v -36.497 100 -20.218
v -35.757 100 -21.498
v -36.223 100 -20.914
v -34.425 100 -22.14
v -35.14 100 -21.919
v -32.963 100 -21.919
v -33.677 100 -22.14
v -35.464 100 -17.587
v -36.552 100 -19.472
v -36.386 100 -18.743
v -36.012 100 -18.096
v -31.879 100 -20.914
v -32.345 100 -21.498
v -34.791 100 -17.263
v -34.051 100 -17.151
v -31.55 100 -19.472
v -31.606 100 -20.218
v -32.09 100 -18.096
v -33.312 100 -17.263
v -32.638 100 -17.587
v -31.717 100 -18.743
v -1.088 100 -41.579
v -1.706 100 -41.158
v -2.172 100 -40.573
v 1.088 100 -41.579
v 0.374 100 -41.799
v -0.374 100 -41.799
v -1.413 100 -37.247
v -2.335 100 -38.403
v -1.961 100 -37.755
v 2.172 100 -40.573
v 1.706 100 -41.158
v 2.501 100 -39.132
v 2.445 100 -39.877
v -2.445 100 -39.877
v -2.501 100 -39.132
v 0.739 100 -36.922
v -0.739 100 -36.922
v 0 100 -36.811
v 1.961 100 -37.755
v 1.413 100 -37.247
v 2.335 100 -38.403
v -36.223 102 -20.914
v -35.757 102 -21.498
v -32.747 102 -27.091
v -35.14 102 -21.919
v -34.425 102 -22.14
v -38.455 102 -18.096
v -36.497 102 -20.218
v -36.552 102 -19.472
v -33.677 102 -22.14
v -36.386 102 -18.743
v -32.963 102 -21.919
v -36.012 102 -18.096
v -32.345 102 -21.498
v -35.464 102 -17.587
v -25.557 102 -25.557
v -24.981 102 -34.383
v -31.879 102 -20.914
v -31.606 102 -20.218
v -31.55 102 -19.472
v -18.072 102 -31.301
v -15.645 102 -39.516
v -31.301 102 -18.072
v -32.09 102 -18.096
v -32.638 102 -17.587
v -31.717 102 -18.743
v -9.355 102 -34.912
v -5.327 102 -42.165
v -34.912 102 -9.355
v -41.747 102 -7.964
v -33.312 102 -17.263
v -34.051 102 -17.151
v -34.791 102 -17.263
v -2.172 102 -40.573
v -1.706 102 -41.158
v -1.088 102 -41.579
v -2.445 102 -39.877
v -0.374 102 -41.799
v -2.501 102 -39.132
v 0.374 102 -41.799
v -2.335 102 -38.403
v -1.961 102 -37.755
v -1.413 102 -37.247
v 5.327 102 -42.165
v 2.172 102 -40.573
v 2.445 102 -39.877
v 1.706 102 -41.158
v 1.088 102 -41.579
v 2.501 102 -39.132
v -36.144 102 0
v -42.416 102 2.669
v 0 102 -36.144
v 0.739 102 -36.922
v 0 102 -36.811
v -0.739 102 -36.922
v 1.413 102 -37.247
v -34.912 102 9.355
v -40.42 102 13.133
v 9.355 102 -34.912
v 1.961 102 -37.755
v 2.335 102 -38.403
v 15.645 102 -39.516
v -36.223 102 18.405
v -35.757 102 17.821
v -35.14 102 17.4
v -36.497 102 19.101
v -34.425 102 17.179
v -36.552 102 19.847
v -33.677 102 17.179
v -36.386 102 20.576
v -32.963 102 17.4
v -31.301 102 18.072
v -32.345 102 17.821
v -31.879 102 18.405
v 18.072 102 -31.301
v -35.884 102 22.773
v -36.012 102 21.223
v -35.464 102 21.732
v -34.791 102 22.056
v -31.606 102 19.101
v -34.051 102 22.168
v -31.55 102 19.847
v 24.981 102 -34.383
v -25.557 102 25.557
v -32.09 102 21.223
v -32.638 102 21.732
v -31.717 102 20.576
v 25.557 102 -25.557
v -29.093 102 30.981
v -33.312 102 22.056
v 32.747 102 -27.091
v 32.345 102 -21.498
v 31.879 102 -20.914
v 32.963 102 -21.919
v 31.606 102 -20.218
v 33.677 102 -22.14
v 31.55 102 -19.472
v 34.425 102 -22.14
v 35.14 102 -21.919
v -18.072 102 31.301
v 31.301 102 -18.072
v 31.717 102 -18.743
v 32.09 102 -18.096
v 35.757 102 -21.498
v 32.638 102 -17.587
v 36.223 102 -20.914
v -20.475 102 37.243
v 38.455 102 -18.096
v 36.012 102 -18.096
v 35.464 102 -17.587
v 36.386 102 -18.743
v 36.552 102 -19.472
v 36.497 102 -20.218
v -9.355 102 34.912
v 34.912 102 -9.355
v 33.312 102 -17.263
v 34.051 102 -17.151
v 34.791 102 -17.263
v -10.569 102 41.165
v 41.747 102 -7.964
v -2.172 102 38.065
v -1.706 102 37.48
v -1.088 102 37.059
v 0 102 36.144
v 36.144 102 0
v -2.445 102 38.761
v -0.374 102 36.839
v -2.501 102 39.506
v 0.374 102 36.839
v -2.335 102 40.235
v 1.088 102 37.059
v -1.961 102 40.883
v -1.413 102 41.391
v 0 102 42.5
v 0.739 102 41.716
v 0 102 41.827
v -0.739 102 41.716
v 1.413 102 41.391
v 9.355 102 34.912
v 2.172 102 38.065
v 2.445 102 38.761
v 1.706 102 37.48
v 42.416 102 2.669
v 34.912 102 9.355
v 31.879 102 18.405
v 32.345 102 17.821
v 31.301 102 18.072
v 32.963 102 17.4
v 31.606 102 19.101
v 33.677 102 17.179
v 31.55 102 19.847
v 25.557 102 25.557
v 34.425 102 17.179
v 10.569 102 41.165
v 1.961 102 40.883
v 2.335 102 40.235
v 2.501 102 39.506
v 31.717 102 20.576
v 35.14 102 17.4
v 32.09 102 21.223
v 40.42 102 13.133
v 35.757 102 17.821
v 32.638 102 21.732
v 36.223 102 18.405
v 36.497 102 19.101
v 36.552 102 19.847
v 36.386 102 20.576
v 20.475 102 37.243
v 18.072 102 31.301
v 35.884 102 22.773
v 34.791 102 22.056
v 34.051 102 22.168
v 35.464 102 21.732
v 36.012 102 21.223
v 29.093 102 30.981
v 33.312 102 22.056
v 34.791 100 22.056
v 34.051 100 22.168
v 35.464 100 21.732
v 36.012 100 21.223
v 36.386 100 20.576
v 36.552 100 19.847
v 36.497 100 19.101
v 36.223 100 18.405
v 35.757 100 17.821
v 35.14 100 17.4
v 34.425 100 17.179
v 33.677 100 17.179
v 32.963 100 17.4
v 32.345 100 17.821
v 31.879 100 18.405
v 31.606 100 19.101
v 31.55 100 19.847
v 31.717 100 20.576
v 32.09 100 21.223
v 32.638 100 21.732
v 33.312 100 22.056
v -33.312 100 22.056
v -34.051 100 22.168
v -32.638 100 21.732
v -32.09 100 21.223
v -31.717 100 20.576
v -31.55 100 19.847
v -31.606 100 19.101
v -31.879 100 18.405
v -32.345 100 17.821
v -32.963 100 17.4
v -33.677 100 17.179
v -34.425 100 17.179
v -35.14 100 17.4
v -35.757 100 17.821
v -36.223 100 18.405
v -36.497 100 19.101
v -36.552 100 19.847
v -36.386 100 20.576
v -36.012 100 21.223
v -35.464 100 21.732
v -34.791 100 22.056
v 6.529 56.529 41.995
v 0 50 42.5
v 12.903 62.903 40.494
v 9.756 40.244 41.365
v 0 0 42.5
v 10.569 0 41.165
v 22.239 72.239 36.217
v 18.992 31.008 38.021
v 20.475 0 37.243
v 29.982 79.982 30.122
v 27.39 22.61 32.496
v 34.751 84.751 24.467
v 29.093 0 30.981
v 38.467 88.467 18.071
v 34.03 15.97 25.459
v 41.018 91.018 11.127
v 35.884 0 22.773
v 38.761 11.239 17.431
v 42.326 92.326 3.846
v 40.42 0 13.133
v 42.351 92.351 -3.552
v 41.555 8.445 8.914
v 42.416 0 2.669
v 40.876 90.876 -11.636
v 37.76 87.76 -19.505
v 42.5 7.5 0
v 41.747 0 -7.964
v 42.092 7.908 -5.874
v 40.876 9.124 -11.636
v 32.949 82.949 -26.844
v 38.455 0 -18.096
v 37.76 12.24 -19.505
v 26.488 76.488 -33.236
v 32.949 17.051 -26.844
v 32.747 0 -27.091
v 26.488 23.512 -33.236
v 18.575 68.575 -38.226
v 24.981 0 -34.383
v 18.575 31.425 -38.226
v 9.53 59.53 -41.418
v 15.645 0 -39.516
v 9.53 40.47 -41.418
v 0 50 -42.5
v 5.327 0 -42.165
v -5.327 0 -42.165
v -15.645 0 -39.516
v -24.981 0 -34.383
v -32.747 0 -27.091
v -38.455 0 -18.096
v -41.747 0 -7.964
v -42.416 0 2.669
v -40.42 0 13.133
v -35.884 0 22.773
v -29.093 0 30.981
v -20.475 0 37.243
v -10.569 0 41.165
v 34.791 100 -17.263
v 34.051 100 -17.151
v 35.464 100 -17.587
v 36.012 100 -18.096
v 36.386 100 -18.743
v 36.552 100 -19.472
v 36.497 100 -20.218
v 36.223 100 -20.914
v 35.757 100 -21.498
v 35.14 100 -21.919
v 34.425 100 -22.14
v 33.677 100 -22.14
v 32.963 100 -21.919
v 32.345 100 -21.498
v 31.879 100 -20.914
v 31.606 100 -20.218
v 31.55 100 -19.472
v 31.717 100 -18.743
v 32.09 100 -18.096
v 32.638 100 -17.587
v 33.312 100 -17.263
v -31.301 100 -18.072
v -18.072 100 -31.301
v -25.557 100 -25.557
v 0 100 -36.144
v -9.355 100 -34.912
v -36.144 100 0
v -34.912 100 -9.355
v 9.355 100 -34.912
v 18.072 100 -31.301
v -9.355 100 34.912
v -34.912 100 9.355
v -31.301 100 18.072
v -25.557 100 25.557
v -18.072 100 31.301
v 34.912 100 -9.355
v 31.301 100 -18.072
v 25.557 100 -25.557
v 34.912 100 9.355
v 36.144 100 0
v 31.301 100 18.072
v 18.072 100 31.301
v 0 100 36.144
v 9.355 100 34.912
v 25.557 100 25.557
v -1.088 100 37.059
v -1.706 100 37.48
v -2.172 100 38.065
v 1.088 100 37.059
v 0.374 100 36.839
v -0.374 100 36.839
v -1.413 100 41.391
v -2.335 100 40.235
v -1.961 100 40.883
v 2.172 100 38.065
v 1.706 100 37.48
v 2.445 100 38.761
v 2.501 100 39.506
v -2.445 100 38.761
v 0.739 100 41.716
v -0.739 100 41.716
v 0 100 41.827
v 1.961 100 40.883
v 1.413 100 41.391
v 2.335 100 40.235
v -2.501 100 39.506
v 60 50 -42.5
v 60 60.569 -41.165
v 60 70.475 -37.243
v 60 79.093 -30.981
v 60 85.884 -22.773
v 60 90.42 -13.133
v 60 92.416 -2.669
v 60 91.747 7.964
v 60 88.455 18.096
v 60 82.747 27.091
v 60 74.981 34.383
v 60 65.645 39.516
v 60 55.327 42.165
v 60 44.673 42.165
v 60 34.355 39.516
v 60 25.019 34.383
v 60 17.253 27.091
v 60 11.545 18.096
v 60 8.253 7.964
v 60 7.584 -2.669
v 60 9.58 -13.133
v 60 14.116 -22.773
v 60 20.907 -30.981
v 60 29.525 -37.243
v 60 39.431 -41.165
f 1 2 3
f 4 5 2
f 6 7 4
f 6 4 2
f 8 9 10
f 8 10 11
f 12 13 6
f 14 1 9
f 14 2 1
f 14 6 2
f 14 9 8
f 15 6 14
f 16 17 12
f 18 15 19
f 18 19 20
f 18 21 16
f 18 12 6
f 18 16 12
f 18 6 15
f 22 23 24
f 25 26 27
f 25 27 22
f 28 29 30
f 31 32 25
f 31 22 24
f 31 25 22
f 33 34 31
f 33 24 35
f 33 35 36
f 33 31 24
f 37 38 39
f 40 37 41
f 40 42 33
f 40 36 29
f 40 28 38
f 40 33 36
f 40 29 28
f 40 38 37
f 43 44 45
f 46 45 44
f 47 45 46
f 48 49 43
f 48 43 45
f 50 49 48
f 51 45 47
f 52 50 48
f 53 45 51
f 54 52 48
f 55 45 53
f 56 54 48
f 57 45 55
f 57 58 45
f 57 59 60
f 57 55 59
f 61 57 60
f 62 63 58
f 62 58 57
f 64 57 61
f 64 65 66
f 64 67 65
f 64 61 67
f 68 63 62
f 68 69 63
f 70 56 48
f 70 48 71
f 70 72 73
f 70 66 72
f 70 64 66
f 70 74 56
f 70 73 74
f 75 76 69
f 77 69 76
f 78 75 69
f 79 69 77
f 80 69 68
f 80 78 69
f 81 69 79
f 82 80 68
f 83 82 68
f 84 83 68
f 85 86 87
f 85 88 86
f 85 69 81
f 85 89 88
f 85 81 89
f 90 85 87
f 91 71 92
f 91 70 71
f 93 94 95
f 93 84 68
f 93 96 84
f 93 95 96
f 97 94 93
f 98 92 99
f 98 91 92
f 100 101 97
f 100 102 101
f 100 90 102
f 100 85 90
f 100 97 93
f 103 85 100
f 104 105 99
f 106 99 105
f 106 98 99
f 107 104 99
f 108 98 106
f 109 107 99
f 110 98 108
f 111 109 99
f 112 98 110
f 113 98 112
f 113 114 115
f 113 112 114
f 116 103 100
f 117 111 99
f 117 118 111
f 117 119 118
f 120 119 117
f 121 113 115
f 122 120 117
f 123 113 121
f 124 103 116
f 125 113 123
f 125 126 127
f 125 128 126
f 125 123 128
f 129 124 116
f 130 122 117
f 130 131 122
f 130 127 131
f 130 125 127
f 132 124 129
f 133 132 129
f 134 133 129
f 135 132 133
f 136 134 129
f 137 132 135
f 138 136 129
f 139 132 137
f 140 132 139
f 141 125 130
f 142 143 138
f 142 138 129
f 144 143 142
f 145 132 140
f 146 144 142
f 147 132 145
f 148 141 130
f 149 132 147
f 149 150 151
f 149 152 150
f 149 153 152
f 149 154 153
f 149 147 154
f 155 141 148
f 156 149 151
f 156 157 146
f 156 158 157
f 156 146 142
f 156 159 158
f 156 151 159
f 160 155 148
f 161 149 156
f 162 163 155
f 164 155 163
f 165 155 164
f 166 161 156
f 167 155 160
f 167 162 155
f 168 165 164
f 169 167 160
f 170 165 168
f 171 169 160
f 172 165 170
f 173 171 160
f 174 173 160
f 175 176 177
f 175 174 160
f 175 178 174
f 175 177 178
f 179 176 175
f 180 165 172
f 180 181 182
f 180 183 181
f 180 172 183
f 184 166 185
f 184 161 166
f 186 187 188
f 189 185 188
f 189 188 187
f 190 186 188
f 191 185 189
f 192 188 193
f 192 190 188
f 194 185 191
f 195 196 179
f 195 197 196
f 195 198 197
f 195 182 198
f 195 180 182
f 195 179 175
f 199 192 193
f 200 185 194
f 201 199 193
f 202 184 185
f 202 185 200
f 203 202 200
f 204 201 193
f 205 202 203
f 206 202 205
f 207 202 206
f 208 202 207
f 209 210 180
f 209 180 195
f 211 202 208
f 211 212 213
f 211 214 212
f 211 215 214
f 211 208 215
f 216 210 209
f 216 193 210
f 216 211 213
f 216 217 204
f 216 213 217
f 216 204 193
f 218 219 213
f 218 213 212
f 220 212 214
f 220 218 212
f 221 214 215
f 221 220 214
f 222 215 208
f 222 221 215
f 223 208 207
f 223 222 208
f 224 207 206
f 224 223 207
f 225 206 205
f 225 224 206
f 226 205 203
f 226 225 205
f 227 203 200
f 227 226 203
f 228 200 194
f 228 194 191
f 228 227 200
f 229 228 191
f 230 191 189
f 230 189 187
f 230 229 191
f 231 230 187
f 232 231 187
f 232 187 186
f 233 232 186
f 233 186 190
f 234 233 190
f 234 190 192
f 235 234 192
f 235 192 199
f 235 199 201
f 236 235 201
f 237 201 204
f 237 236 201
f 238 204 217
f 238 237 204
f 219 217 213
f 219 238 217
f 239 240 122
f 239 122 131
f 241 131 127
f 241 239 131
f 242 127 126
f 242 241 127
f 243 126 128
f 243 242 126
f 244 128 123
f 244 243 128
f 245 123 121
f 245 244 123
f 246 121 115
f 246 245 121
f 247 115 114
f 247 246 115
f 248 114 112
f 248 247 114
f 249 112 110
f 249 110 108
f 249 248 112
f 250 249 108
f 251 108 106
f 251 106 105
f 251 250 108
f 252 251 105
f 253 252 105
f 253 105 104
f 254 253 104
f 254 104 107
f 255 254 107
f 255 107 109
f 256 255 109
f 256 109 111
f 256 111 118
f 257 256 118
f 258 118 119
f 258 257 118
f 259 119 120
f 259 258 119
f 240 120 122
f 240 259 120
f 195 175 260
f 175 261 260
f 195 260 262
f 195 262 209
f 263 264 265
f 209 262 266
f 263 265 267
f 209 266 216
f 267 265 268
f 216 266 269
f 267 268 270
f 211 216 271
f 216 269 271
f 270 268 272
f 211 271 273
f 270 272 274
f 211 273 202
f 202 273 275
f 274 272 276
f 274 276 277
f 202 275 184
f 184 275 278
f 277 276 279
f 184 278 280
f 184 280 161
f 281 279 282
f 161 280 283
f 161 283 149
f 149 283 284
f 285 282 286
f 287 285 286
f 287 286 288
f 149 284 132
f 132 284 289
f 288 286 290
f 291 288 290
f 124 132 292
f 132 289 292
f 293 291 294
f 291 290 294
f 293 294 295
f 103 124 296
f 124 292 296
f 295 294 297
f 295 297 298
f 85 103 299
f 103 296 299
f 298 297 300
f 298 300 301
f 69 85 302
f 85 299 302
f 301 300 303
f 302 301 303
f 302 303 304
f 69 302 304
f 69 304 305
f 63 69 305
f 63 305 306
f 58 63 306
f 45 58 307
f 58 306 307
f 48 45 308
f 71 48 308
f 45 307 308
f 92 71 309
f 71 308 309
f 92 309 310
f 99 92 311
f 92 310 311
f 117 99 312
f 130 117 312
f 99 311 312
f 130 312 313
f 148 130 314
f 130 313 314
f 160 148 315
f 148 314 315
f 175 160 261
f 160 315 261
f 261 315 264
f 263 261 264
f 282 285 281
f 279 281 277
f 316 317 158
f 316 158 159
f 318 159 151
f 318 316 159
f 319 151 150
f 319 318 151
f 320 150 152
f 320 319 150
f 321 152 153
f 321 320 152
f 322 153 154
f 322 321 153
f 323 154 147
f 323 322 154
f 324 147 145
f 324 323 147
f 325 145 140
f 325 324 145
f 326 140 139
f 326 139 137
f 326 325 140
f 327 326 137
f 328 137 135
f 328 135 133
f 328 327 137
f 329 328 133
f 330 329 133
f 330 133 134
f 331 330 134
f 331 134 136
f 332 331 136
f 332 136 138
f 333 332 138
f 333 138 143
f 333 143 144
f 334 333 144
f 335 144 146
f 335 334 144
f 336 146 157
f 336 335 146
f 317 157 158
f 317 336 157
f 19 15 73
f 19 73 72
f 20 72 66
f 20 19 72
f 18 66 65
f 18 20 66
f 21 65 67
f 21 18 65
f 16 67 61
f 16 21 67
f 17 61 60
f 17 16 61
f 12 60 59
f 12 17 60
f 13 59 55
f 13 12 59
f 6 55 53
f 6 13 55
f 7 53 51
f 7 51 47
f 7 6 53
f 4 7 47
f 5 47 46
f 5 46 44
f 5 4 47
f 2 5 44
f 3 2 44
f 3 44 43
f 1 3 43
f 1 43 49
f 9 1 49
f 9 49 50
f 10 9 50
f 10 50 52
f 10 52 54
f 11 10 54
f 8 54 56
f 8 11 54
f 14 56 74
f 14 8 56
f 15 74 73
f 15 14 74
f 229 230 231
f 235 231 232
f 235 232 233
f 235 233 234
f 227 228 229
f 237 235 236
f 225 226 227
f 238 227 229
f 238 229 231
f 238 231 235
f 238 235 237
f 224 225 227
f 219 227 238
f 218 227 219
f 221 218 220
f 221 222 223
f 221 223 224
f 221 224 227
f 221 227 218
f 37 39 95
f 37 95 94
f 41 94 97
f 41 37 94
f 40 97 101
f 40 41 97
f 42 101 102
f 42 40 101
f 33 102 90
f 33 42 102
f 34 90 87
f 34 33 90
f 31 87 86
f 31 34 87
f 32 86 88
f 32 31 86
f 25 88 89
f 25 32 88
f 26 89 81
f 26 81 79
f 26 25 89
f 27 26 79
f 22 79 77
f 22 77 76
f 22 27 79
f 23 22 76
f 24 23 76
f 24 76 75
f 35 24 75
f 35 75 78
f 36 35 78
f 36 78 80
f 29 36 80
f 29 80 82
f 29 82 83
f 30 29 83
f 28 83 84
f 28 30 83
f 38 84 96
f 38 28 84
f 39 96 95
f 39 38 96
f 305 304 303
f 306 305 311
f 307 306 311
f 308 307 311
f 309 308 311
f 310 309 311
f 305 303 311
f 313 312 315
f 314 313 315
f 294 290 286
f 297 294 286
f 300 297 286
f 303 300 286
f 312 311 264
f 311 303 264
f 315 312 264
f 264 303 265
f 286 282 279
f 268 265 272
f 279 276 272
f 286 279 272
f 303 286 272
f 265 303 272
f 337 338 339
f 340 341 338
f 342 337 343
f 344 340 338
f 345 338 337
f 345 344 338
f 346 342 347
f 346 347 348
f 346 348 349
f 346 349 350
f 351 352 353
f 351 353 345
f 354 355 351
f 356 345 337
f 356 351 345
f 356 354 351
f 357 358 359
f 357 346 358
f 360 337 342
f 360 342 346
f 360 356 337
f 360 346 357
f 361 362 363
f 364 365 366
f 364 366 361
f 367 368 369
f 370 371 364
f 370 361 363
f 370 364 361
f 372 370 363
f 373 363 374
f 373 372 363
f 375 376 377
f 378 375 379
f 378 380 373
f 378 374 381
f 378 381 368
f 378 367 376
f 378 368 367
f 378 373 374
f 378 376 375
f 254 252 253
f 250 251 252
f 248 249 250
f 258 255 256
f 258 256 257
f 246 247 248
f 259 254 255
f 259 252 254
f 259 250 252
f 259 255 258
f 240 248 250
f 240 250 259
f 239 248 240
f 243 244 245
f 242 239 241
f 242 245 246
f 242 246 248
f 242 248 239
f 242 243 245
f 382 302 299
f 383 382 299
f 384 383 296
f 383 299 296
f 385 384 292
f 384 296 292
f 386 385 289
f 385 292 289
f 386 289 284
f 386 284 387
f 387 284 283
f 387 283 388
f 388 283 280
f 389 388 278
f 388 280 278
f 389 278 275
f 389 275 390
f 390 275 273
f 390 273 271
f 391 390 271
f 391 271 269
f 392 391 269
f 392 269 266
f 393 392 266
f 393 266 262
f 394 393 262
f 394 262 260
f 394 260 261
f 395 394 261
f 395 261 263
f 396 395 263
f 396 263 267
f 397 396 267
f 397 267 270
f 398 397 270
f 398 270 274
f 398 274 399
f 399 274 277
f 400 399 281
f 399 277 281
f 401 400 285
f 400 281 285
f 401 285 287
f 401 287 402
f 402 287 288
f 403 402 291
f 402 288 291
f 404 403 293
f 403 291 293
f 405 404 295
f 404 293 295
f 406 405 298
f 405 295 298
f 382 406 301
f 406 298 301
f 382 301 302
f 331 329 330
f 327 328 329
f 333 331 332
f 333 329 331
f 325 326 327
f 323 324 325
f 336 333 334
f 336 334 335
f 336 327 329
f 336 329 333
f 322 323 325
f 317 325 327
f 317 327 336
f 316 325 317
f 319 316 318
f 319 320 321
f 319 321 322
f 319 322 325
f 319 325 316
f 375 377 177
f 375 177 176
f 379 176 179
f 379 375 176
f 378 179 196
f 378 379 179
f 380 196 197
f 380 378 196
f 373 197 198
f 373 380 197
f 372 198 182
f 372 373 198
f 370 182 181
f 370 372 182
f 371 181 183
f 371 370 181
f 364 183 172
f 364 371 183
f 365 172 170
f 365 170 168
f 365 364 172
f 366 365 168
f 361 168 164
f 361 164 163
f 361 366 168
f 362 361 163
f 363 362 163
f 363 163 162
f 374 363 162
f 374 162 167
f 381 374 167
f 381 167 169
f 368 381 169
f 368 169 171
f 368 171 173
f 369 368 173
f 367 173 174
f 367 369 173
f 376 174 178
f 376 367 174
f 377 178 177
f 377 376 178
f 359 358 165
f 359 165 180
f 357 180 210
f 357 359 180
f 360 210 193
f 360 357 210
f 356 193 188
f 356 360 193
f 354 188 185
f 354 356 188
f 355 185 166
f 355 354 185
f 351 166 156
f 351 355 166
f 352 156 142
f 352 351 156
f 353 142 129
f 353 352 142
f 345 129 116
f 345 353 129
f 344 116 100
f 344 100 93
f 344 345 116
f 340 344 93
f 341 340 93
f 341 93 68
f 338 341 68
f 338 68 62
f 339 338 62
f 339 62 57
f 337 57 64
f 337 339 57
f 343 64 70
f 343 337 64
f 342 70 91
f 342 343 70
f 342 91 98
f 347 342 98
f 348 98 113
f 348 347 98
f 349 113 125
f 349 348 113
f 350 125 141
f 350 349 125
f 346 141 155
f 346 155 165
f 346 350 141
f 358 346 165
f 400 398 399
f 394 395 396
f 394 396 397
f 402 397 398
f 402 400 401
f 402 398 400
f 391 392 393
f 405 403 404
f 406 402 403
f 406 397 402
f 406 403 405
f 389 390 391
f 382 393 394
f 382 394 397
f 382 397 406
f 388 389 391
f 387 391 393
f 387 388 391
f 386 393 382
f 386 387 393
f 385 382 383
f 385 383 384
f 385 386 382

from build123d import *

# Parameters (mm, degrees)
CROQUIS1_R              = 42.5
SALIENTE_EXTRUIR1_DEPTH = 100
CROQUIS2_R              = 42.5
SALIENTE_EXTRUIR2_DEPTH = 60
CROQUIS3_R              = 42.5
CROQUIS3_R_2            = 36.143595246
CROQUIS3_R_3            = 2.508178933
SALIENTE_EXTRUIR3_DEPTH = 2


with BuildPart() as part:
    # Croquis1 → Saliente-Extruir1 (new body)
    with BuildSketch(Plane(origin=(0, 0, 0), x_dir=(1, 0, 0), z_dir=(0, 1, 0))):
        with Locations(Location((0, 0, 0), (0, 0, 270))):
            Circle(CROQUIS1_R)
    extrude(amount=SALIENTE_EXTRUIR1_DEPTH)

    # Croquis2 → Saliente-Extruir2 (add)
    with BuildSketch(Plane(origin=(0, 0, 0), x_dir=(0, 0, -1), z_dir=(1, 0, 0))):
        with Locations((0, 50)):
            Circle(CROQUIS2_R)
    extrude(amount=SALIENTE_EXTRUIR2_DEPTH)

    # Croquis3 → Saliente-Extruir3 (add)
    with BuildSketch(Plane(origin=(0, 100, 0), x_dir=(1, 0, 0), z_dir=(0, 1, 0))):
        with Locations(Location((0, 0, 0), (0, 0, 270))):
            Circle(CROQUIS3_R)
        with Locations(Location((0, 0, 0), (0, 0, 270))):
            Circle(CROQUIS3_R_2, mode=Mode.SUBTRACT)
        with Locations(Location((0, 39.319059372, 0), (0, 0, 270))):
            Circle(CROQUIS3_R_3, mode=Mode.SUBTRACT)
        with Locations(Location((34.051304269, 19.659529686, 0), (0, 0, 270))):
            Circle(CROQUIS3_R_3, mode=Mode.SUBTRACT)
        with Locations(Location((34.051304269, -19.659529686, 0), (0, 0, 270))):
            Circle(CROQUIS3_R_3, mode=Mode.SUBTRACT)
        with Locations(Location((0, -39.319059372, 0), (0, 0, 270))):
            Circle(CROQUIS3_R_3, mode=Mode.SUBTRACT)
        with Locations(Location((-34.051304269, -19.659529686, 0), (0, 0, 270))):
            Circle(CROQUIS3_R_3, mode=Mode.SUBTRACT)
        with Locations(Location((-34.051304269, 19.659529686, 0), (0, 0, 270))):
            Circle(CROQUIS3_R_3, mode=Mode.SUBTRACT)
    extrude(amount=SALIENTE_EXTRUIR3_DEPTH)


solid = part.part
